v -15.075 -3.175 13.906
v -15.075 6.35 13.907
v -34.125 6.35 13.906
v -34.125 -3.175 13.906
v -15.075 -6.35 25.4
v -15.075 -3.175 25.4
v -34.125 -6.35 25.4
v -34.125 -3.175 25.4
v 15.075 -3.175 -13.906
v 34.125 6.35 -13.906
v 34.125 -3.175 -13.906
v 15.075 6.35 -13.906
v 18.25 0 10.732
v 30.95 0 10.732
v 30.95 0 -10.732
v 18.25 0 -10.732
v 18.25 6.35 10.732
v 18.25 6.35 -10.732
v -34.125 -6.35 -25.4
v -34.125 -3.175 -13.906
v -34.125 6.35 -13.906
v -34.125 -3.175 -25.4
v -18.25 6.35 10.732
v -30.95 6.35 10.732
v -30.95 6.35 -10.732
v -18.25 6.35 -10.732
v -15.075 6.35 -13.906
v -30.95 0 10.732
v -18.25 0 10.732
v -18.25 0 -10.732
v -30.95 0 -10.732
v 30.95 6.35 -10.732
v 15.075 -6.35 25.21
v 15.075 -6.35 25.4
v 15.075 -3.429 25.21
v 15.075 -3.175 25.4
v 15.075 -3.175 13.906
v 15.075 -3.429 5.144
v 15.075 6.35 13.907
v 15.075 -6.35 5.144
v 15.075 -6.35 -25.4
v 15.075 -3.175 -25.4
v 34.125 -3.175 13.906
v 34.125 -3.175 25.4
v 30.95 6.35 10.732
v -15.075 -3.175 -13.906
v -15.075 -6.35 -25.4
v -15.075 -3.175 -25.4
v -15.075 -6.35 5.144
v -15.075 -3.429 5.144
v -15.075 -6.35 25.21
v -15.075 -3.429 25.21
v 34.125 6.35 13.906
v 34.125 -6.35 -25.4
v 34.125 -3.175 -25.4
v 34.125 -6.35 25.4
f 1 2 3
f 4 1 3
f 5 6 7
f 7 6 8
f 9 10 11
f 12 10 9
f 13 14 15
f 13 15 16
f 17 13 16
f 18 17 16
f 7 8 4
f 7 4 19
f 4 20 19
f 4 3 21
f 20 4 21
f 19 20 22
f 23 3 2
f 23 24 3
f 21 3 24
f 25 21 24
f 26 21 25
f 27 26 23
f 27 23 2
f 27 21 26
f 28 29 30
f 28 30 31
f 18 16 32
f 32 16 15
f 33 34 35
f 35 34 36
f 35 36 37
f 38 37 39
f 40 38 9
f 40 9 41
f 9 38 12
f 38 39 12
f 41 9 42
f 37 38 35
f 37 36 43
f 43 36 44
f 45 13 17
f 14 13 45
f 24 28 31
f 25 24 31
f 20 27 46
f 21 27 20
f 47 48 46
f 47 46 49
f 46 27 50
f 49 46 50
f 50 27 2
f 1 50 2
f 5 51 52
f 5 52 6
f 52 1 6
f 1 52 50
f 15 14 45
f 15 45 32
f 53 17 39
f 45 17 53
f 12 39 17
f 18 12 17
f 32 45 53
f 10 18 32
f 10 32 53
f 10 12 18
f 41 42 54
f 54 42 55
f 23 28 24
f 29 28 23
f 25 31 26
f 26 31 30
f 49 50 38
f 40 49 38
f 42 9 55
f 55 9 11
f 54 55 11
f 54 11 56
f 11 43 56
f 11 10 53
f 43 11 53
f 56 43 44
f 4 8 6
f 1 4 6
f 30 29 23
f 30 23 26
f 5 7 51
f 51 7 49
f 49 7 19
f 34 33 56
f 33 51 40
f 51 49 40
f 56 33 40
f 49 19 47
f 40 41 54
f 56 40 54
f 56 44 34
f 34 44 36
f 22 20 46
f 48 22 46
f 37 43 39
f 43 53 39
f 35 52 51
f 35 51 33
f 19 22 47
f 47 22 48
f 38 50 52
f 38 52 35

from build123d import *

# Parameters (mm, degrees)
SKETCH1_W           = 12.7
SKETCH1_H           = 21.463
BOSS_EXTRUDE1_DEPTH = 6.35
BOSS_EXTRUDE2_DEPTH = 3.175
BOSS_EXTRUDE3_DEPTH = 3.175
SKETCH4_W           = 30.1498
SKETCH4_H           = 8.763
CUT_EXTRUDE1_DEPTH  = 9.779
SKETCH6_W           = 30.1498
SKETCH6_H           = 2.921
BOSS_EXTRUDE4_DEPTH = 11.303


with BuildPart() as part:
    # Sketch1 → Boss-Extrude1 (new body)
    with BuildSketch(Plane(origin=(0, 0, 0), x_dir=(1, 0, 0), z_dir=(0, 1, 0))):
        Polygon((-34.1249, 13.9065), (-34.1249, -13.9065), (-15.0749, -13.9065), (15.0749, -13.9065), (34.1249, -13.9065), (34.1249, 13.9065), (15.0749, 13.9065), (15.0749, -5.1435), (-15.0749, -5.1435), (-15.0749, 13.9065), align=None)
        with Locations((-24.5999, 0)):
            Rectangle(SKETCH1_W, SKETCH1_H, mode=Mode.SUBTRACT)
        with Locations((24.5999, 0)):
            Rectangle(SKETCH1_W, SKETCH1_H, mode=Mode.SUBTRACT)
    extrude(amount=BOSS_EXTRUDE1_DEPTH)

    # Sketch2 → Boss-Extrude2 (add)
    with BuildSketch(Plane.XZ):
        Polygon((-15.0749, 5.1435), (-15.0749, -13.9065), (-34.1249, -13.9065), (-34.1249, 13.9065), (34.1249, 13.9065), (34.1249, -13.9065), (15.0749, -13.9065), (15.0749, 5.1435), align=None)
    extrude(amount=BOSS_EXTRUDE2_DEPTH)

    # Sketch3 → Boss-Extrude3 (add)
    with BuildSketch(Plane.XZ.offset(3.175)):
        Polygon((-34.1249, -25.4), (-15.0749, -25.4), (-15.0749, 5.1435), (15.0749, 5.1435), (15.0749, -25.4), (34.1249, -25.4), (34.1249, 25.4), (15.0749, 25.4), (15.0749, 13.9065), (-15.0749, 13.9065), (-15.0749, 25.4), (-34.1249, 25.4), align=None)
    extrude(amount=BOSS_EXTRUDE3_DEPTH)

    # Sketch4 → Cut-Extrude1 (cut)
    with BuildSketch(Plane(origin=(0, 6.35, 0), x_dir=(1, 0, 0), z_dir=(0, 1, 0))):
        with Locations((0, -9.525)):
            Rectangle(SKETCH4_W, SKETCH4_H)
    extrude(amount=-CUT_EXTRUDE1_DEPTH, mode=Mode.SUBTRACT)

    # Sketch6 → Boss-Extrude4 (add)
    with BuildSketch(Plane.XY.offset(13.9065)):
        with Locations((0, -4.8895)):
            Rectangle(SKETCH6_W, SKETCH6_H)
    extrude(amount=BOSS_EXTRUDE4_DEPTH)


solid = part.part
